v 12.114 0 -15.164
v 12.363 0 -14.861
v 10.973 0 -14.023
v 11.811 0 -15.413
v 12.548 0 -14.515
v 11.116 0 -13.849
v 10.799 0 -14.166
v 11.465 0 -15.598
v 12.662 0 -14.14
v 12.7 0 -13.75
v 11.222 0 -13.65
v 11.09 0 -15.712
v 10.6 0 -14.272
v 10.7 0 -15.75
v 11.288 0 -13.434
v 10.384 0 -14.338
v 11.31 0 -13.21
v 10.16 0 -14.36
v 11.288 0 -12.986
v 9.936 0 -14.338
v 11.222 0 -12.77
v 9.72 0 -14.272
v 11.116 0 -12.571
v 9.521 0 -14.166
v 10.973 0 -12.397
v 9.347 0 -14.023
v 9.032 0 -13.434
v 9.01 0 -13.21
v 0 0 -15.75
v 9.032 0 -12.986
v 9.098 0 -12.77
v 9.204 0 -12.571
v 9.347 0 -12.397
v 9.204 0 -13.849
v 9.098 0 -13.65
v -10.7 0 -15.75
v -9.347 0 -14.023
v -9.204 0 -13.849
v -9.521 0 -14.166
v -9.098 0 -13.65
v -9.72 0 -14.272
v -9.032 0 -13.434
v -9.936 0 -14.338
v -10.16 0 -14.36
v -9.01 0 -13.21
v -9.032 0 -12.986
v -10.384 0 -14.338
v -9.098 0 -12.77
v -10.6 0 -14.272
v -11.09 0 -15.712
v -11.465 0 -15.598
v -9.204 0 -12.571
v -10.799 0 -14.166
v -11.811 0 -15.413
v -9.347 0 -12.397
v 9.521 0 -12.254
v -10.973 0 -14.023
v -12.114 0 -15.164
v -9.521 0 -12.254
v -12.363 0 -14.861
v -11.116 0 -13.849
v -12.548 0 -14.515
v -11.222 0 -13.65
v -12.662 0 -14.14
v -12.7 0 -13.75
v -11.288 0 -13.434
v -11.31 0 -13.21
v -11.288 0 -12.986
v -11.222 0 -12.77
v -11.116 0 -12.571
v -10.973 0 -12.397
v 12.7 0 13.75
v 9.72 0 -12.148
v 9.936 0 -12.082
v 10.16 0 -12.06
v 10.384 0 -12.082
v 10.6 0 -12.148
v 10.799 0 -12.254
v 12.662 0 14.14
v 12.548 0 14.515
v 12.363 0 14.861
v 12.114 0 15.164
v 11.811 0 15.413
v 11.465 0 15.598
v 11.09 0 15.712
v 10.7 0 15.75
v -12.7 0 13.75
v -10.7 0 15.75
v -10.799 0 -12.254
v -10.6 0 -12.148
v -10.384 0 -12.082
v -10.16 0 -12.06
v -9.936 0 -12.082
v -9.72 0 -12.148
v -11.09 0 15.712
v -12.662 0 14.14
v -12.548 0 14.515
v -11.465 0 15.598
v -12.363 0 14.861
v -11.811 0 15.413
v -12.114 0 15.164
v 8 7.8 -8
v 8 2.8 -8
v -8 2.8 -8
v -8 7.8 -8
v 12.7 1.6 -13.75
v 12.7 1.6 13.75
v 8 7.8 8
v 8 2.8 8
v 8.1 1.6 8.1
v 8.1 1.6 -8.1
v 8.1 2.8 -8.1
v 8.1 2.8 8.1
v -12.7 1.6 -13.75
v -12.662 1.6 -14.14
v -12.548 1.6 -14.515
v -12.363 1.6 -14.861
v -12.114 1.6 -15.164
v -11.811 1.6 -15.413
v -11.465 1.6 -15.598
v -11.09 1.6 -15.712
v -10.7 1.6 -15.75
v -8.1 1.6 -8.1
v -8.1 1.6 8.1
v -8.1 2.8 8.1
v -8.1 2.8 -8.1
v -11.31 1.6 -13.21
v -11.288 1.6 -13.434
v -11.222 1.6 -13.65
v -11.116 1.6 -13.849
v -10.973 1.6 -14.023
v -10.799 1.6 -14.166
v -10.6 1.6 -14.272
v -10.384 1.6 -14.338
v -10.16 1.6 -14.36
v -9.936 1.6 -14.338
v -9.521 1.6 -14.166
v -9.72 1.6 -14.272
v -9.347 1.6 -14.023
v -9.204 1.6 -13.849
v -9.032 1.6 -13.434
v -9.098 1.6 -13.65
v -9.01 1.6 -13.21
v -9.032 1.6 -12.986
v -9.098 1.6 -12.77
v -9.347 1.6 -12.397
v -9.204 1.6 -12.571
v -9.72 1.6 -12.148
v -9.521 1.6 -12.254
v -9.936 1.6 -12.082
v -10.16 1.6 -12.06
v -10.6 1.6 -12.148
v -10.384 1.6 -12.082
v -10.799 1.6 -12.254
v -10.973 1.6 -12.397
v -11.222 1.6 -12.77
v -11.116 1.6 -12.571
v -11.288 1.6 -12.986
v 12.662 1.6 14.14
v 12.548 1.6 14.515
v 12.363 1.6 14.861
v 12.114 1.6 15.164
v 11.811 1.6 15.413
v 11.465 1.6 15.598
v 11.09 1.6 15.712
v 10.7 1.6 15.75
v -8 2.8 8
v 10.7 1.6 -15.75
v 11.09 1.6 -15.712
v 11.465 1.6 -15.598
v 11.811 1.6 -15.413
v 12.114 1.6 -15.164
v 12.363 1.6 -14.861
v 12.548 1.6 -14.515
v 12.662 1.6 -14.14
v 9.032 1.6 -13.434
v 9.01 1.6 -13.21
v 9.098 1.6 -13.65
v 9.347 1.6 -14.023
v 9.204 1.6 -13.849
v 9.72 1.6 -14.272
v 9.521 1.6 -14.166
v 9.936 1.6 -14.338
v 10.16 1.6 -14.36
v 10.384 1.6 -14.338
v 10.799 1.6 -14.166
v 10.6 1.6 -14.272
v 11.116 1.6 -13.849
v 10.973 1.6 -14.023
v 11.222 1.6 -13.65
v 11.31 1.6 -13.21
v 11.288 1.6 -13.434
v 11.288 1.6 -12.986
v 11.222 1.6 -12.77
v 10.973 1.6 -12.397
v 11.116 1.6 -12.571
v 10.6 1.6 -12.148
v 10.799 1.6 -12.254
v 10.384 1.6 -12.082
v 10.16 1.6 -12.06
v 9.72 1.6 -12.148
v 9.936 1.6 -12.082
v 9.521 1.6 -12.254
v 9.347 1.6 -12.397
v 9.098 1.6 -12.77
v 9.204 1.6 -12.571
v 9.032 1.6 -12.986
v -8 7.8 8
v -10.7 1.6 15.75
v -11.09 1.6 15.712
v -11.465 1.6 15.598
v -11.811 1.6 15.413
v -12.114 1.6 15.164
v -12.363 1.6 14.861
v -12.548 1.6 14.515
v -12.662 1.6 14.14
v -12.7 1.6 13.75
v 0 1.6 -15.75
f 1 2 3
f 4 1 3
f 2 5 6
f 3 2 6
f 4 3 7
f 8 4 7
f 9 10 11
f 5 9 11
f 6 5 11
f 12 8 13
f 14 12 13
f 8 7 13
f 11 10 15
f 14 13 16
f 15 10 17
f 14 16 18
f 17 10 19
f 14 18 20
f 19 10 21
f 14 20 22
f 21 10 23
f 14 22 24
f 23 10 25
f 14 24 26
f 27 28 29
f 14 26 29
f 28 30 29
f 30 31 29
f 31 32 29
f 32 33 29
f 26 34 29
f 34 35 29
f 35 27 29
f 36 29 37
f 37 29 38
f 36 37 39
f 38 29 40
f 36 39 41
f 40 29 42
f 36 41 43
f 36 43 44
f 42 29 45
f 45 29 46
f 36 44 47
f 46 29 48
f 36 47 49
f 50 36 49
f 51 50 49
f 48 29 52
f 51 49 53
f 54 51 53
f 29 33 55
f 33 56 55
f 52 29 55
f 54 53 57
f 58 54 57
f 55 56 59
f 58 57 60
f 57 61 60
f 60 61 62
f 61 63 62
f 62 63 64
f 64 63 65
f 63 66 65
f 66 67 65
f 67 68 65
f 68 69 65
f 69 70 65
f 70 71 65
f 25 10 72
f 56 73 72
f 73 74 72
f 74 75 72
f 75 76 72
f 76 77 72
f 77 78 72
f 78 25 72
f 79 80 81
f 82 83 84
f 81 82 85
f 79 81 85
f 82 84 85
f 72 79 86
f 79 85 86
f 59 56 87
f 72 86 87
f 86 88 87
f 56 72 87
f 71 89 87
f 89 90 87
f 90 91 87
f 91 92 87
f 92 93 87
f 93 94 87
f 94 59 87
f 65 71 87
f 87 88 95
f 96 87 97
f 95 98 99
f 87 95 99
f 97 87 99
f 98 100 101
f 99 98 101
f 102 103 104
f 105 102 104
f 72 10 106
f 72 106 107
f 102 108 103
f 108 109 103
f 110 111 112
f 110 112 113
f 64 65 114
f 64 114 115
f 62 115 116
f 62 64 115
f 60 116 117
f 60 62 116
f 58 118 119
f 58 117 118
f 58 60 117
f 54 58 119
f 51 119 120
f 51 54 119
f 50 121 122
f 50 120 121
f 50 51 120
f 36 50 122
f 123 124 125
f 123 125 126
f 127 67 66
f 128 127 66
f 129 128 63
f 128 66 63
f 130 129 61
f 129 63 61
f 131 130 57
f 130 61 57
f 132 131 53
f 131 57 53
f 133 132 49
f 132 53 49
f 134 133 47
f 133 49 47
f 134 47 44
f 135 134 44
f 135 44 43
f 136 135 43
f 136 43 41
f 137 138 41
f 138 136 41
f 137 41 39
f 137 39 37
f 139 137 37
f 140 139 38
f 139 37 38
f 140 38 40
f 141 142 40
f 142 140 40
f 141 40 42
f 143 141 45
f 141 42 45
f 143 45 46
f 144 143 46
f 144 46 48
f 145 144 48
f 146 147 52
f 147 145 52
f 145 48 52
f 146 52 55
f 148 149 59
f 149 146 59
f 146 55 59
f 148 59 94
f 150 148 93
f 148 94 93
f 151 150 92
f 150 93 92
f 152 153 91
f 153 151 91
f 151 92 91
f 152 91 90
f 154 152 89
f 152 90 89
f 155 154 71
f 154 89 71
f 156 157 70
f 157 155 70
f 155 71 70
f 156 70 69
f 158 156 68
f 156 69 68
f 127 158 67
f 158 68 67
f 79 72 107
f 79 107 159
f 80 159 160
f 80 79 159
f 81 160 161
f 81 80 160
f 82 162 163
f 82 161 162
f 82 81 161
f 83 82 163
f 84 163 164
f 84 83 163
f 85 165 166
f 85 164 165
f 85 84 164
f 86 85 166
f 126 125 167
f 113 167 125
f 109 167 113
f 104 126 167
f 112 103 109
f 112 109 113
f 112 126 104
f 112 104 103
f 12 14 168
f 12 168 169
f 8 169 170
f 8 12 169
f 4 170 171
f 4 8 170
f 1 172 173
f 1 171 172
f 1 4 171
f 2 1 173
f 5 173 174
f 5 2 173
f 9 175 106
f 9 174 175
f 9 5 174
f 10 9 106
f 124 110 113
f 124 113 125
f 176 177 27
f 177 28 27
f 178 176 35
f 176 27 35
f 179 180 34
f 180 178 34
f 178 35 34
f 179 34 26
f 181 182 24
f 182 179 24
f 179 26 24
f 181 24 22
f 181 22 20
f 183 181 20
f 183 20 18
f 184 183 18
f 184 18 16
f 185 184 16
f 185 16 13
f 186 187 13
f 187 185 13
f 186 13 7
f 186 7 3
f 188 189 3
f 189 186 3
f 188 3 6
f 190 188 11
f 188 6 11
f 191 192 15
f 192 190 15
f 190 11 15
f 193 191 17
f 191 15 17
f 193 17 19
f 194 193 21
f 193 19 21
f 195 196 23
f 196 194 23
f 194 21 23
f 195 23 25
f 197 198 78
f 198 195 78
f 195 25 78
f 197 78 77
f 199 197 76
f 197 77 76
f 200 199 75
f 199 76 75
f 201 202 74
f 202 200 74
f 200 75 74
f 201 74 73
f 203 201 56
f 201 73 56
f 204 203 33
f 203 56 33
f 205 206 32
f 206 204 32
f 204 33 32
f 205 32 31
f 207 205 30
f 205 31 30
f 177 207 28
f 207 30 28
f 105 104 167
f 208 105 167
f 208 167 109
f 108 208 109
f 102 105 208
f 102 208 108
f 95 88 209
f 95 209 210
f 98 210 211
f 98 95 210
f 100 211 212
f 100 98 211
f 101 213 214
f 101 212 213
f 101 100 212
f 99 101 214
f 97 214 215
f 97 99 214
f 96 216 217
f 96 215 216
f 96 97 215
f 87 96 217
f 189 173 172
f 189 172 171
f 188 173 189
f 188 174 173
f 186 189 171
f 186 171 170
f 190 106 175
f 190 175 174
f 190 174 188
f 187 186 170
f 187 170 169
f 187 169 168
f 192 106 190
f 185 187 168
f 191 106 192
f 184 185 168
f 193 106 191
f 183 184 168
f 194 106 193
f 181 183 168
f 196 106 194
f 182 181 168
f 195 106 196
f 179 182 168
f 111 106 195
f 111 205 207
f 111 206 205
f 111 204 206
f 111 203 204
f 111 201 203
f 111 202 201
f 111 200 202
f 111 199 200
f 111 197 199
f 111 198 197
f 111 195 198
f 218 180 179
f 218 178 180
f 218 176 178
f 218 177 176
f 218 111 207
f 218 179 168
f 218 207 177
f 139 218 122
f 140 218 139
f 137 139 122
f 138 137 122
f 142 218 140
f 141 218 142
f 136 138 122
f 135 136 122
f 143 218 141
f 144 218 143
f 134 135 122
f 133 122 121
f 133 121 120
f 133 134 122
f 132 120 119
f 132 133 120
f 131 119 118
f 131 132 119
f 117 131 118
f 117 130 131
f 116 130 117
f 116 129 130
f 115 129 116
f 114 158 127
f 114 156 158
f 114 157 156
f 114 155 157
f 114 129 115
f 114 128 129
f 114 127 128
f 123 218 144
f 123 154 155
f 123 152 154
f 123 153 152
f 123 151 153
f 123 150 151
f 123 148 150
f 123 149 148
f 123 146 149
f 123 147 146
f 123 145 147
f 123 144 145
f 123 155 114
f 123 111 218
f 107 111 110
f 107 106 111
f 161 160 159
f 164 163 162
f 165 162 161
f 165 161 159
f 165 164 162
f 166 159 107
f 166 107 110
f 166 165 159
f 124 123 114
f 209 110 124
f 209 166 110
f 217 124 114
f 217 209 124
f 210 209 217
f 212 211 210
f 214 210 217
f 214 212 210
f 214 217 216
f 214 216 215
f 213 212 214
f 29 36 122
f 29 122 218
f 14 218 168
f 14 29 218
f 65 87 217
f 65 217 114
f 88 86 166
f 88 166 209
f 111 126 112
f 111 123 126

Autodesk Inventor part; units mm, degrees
ref_plane "YZ Plane" through (0, 0, 0) normal (1, 0, 0) x (0, 1, 0)
ref_plane "XZ Plane" through (0, 0, 0) normal (0, 1, 0) x (-1, 0, 0)
ref_plane "XY Plane" through (0, 0, 0) normal (0, 0, 1) x (1, 0, 0)
sketch "Boceto1" plane through (0, 0, 0) normal (0, 1, 0) x (-1, 0, 0)
  line L0 (-10.7, 15.75) -> (10.7, 15.75)
  line L1 (12.7, 13.75) -> (12.7, -13.75)
  line L2 (10.7, -15.75) -> (-10.7, -15.75)
  line L3 (-12.7, -13.75) -> (-12.7, 13.75)
  line L4 (-12.7, 15.75) -> (12.7, -15.75) construction
  line L5 (12.7, 15.75) -> (-12.7, -15.75) construction
  arc A0 (10.7, -15.75) -> (12.7, -13.75) centre (10.7, -13.75) ccw
  arc A1 (12.7, 13.75) -> (10.7, 15.75) centre (10.7, 13.75) ccw
  arc A2 (-10.7, 15.75) -> (-12.7, 13.75) centre (-10.7, 13.75) ccw
  arc A3 (-12.7, -13.75) -> (-10.7, -15.75) centre (-10.7, -13.75) ccw
  line L6 (0, -15.75) -> (0, -13.21)
  line L7 (0, -13.21) -> (10.16, -13.21)
  line L8 (0, -13.21) -> (-10.16, -13.21)
  circle A4 centre (10.16, -13.21) radius 1.15
  circle A5 centre (-10.16, -13.21) radius 1.15
  point P0 (0, 0)
  dimension "d0" = 25.4
  dimension "d1" = 31.5
  dimension "d2" = 2
  dimension "d3" = 2.54
  dimension "d4" = 10.16
  dimension "d5" = 10.16
  dimension "d6" = 2.3
  dimension "d7" = 2.3
extrude "Extrusión1" add sketch "Boceto1" along normal blind 1.6
sketch "Boceto2" plane through (0, 1.6, 0) normal (0, 1, 0) x (1, 0, 0)
  line L0 (-8, -8) -> (8, -8)
  line L1 (8, -8) -> (8, 8)
  line L2 (8, 8) -> (-8, 8)
  line L3 (-8, 8) -> (-8, -8)
  line L4 (-8, -8) -> (8, 8) construction
  line L5 (8, -8) -> (-8, 8) construction
  point P0 (0, 0)
  dimension "d10" = 16
  dimension "d11" = 16
extrude "Extrusión2" add sketch "Boceto2" along normal blind 6.2
sketch "Boceto3" plane through (0, 1.6, 0) normal (0, 1, 0) x (1, 0, 0)
  line L0 (8.1, -8.1) -> (-8.1, -8.1)
  line L1 (-8.1, -8.1) -> (-8.1, 8.1)
  line L2 (-8.1, 8.1) -> (8.1, 8.1)
  line L3 (8.1, 8.1) -> (8.1, -8.1)
  line L4 (8.1, -8.1) -> (-8.1, 8.1) construction
  line L5 (-8.1, -8.1) -> (8.1, 8.1) construction
  point P0 (0, 0)
  dimension "d14" = 16.2
  dimension "d15" = 16.2
extrude "Extrusión3" add sketch "Boceto3" along normal blind 1.2
properties part number "GPS"
